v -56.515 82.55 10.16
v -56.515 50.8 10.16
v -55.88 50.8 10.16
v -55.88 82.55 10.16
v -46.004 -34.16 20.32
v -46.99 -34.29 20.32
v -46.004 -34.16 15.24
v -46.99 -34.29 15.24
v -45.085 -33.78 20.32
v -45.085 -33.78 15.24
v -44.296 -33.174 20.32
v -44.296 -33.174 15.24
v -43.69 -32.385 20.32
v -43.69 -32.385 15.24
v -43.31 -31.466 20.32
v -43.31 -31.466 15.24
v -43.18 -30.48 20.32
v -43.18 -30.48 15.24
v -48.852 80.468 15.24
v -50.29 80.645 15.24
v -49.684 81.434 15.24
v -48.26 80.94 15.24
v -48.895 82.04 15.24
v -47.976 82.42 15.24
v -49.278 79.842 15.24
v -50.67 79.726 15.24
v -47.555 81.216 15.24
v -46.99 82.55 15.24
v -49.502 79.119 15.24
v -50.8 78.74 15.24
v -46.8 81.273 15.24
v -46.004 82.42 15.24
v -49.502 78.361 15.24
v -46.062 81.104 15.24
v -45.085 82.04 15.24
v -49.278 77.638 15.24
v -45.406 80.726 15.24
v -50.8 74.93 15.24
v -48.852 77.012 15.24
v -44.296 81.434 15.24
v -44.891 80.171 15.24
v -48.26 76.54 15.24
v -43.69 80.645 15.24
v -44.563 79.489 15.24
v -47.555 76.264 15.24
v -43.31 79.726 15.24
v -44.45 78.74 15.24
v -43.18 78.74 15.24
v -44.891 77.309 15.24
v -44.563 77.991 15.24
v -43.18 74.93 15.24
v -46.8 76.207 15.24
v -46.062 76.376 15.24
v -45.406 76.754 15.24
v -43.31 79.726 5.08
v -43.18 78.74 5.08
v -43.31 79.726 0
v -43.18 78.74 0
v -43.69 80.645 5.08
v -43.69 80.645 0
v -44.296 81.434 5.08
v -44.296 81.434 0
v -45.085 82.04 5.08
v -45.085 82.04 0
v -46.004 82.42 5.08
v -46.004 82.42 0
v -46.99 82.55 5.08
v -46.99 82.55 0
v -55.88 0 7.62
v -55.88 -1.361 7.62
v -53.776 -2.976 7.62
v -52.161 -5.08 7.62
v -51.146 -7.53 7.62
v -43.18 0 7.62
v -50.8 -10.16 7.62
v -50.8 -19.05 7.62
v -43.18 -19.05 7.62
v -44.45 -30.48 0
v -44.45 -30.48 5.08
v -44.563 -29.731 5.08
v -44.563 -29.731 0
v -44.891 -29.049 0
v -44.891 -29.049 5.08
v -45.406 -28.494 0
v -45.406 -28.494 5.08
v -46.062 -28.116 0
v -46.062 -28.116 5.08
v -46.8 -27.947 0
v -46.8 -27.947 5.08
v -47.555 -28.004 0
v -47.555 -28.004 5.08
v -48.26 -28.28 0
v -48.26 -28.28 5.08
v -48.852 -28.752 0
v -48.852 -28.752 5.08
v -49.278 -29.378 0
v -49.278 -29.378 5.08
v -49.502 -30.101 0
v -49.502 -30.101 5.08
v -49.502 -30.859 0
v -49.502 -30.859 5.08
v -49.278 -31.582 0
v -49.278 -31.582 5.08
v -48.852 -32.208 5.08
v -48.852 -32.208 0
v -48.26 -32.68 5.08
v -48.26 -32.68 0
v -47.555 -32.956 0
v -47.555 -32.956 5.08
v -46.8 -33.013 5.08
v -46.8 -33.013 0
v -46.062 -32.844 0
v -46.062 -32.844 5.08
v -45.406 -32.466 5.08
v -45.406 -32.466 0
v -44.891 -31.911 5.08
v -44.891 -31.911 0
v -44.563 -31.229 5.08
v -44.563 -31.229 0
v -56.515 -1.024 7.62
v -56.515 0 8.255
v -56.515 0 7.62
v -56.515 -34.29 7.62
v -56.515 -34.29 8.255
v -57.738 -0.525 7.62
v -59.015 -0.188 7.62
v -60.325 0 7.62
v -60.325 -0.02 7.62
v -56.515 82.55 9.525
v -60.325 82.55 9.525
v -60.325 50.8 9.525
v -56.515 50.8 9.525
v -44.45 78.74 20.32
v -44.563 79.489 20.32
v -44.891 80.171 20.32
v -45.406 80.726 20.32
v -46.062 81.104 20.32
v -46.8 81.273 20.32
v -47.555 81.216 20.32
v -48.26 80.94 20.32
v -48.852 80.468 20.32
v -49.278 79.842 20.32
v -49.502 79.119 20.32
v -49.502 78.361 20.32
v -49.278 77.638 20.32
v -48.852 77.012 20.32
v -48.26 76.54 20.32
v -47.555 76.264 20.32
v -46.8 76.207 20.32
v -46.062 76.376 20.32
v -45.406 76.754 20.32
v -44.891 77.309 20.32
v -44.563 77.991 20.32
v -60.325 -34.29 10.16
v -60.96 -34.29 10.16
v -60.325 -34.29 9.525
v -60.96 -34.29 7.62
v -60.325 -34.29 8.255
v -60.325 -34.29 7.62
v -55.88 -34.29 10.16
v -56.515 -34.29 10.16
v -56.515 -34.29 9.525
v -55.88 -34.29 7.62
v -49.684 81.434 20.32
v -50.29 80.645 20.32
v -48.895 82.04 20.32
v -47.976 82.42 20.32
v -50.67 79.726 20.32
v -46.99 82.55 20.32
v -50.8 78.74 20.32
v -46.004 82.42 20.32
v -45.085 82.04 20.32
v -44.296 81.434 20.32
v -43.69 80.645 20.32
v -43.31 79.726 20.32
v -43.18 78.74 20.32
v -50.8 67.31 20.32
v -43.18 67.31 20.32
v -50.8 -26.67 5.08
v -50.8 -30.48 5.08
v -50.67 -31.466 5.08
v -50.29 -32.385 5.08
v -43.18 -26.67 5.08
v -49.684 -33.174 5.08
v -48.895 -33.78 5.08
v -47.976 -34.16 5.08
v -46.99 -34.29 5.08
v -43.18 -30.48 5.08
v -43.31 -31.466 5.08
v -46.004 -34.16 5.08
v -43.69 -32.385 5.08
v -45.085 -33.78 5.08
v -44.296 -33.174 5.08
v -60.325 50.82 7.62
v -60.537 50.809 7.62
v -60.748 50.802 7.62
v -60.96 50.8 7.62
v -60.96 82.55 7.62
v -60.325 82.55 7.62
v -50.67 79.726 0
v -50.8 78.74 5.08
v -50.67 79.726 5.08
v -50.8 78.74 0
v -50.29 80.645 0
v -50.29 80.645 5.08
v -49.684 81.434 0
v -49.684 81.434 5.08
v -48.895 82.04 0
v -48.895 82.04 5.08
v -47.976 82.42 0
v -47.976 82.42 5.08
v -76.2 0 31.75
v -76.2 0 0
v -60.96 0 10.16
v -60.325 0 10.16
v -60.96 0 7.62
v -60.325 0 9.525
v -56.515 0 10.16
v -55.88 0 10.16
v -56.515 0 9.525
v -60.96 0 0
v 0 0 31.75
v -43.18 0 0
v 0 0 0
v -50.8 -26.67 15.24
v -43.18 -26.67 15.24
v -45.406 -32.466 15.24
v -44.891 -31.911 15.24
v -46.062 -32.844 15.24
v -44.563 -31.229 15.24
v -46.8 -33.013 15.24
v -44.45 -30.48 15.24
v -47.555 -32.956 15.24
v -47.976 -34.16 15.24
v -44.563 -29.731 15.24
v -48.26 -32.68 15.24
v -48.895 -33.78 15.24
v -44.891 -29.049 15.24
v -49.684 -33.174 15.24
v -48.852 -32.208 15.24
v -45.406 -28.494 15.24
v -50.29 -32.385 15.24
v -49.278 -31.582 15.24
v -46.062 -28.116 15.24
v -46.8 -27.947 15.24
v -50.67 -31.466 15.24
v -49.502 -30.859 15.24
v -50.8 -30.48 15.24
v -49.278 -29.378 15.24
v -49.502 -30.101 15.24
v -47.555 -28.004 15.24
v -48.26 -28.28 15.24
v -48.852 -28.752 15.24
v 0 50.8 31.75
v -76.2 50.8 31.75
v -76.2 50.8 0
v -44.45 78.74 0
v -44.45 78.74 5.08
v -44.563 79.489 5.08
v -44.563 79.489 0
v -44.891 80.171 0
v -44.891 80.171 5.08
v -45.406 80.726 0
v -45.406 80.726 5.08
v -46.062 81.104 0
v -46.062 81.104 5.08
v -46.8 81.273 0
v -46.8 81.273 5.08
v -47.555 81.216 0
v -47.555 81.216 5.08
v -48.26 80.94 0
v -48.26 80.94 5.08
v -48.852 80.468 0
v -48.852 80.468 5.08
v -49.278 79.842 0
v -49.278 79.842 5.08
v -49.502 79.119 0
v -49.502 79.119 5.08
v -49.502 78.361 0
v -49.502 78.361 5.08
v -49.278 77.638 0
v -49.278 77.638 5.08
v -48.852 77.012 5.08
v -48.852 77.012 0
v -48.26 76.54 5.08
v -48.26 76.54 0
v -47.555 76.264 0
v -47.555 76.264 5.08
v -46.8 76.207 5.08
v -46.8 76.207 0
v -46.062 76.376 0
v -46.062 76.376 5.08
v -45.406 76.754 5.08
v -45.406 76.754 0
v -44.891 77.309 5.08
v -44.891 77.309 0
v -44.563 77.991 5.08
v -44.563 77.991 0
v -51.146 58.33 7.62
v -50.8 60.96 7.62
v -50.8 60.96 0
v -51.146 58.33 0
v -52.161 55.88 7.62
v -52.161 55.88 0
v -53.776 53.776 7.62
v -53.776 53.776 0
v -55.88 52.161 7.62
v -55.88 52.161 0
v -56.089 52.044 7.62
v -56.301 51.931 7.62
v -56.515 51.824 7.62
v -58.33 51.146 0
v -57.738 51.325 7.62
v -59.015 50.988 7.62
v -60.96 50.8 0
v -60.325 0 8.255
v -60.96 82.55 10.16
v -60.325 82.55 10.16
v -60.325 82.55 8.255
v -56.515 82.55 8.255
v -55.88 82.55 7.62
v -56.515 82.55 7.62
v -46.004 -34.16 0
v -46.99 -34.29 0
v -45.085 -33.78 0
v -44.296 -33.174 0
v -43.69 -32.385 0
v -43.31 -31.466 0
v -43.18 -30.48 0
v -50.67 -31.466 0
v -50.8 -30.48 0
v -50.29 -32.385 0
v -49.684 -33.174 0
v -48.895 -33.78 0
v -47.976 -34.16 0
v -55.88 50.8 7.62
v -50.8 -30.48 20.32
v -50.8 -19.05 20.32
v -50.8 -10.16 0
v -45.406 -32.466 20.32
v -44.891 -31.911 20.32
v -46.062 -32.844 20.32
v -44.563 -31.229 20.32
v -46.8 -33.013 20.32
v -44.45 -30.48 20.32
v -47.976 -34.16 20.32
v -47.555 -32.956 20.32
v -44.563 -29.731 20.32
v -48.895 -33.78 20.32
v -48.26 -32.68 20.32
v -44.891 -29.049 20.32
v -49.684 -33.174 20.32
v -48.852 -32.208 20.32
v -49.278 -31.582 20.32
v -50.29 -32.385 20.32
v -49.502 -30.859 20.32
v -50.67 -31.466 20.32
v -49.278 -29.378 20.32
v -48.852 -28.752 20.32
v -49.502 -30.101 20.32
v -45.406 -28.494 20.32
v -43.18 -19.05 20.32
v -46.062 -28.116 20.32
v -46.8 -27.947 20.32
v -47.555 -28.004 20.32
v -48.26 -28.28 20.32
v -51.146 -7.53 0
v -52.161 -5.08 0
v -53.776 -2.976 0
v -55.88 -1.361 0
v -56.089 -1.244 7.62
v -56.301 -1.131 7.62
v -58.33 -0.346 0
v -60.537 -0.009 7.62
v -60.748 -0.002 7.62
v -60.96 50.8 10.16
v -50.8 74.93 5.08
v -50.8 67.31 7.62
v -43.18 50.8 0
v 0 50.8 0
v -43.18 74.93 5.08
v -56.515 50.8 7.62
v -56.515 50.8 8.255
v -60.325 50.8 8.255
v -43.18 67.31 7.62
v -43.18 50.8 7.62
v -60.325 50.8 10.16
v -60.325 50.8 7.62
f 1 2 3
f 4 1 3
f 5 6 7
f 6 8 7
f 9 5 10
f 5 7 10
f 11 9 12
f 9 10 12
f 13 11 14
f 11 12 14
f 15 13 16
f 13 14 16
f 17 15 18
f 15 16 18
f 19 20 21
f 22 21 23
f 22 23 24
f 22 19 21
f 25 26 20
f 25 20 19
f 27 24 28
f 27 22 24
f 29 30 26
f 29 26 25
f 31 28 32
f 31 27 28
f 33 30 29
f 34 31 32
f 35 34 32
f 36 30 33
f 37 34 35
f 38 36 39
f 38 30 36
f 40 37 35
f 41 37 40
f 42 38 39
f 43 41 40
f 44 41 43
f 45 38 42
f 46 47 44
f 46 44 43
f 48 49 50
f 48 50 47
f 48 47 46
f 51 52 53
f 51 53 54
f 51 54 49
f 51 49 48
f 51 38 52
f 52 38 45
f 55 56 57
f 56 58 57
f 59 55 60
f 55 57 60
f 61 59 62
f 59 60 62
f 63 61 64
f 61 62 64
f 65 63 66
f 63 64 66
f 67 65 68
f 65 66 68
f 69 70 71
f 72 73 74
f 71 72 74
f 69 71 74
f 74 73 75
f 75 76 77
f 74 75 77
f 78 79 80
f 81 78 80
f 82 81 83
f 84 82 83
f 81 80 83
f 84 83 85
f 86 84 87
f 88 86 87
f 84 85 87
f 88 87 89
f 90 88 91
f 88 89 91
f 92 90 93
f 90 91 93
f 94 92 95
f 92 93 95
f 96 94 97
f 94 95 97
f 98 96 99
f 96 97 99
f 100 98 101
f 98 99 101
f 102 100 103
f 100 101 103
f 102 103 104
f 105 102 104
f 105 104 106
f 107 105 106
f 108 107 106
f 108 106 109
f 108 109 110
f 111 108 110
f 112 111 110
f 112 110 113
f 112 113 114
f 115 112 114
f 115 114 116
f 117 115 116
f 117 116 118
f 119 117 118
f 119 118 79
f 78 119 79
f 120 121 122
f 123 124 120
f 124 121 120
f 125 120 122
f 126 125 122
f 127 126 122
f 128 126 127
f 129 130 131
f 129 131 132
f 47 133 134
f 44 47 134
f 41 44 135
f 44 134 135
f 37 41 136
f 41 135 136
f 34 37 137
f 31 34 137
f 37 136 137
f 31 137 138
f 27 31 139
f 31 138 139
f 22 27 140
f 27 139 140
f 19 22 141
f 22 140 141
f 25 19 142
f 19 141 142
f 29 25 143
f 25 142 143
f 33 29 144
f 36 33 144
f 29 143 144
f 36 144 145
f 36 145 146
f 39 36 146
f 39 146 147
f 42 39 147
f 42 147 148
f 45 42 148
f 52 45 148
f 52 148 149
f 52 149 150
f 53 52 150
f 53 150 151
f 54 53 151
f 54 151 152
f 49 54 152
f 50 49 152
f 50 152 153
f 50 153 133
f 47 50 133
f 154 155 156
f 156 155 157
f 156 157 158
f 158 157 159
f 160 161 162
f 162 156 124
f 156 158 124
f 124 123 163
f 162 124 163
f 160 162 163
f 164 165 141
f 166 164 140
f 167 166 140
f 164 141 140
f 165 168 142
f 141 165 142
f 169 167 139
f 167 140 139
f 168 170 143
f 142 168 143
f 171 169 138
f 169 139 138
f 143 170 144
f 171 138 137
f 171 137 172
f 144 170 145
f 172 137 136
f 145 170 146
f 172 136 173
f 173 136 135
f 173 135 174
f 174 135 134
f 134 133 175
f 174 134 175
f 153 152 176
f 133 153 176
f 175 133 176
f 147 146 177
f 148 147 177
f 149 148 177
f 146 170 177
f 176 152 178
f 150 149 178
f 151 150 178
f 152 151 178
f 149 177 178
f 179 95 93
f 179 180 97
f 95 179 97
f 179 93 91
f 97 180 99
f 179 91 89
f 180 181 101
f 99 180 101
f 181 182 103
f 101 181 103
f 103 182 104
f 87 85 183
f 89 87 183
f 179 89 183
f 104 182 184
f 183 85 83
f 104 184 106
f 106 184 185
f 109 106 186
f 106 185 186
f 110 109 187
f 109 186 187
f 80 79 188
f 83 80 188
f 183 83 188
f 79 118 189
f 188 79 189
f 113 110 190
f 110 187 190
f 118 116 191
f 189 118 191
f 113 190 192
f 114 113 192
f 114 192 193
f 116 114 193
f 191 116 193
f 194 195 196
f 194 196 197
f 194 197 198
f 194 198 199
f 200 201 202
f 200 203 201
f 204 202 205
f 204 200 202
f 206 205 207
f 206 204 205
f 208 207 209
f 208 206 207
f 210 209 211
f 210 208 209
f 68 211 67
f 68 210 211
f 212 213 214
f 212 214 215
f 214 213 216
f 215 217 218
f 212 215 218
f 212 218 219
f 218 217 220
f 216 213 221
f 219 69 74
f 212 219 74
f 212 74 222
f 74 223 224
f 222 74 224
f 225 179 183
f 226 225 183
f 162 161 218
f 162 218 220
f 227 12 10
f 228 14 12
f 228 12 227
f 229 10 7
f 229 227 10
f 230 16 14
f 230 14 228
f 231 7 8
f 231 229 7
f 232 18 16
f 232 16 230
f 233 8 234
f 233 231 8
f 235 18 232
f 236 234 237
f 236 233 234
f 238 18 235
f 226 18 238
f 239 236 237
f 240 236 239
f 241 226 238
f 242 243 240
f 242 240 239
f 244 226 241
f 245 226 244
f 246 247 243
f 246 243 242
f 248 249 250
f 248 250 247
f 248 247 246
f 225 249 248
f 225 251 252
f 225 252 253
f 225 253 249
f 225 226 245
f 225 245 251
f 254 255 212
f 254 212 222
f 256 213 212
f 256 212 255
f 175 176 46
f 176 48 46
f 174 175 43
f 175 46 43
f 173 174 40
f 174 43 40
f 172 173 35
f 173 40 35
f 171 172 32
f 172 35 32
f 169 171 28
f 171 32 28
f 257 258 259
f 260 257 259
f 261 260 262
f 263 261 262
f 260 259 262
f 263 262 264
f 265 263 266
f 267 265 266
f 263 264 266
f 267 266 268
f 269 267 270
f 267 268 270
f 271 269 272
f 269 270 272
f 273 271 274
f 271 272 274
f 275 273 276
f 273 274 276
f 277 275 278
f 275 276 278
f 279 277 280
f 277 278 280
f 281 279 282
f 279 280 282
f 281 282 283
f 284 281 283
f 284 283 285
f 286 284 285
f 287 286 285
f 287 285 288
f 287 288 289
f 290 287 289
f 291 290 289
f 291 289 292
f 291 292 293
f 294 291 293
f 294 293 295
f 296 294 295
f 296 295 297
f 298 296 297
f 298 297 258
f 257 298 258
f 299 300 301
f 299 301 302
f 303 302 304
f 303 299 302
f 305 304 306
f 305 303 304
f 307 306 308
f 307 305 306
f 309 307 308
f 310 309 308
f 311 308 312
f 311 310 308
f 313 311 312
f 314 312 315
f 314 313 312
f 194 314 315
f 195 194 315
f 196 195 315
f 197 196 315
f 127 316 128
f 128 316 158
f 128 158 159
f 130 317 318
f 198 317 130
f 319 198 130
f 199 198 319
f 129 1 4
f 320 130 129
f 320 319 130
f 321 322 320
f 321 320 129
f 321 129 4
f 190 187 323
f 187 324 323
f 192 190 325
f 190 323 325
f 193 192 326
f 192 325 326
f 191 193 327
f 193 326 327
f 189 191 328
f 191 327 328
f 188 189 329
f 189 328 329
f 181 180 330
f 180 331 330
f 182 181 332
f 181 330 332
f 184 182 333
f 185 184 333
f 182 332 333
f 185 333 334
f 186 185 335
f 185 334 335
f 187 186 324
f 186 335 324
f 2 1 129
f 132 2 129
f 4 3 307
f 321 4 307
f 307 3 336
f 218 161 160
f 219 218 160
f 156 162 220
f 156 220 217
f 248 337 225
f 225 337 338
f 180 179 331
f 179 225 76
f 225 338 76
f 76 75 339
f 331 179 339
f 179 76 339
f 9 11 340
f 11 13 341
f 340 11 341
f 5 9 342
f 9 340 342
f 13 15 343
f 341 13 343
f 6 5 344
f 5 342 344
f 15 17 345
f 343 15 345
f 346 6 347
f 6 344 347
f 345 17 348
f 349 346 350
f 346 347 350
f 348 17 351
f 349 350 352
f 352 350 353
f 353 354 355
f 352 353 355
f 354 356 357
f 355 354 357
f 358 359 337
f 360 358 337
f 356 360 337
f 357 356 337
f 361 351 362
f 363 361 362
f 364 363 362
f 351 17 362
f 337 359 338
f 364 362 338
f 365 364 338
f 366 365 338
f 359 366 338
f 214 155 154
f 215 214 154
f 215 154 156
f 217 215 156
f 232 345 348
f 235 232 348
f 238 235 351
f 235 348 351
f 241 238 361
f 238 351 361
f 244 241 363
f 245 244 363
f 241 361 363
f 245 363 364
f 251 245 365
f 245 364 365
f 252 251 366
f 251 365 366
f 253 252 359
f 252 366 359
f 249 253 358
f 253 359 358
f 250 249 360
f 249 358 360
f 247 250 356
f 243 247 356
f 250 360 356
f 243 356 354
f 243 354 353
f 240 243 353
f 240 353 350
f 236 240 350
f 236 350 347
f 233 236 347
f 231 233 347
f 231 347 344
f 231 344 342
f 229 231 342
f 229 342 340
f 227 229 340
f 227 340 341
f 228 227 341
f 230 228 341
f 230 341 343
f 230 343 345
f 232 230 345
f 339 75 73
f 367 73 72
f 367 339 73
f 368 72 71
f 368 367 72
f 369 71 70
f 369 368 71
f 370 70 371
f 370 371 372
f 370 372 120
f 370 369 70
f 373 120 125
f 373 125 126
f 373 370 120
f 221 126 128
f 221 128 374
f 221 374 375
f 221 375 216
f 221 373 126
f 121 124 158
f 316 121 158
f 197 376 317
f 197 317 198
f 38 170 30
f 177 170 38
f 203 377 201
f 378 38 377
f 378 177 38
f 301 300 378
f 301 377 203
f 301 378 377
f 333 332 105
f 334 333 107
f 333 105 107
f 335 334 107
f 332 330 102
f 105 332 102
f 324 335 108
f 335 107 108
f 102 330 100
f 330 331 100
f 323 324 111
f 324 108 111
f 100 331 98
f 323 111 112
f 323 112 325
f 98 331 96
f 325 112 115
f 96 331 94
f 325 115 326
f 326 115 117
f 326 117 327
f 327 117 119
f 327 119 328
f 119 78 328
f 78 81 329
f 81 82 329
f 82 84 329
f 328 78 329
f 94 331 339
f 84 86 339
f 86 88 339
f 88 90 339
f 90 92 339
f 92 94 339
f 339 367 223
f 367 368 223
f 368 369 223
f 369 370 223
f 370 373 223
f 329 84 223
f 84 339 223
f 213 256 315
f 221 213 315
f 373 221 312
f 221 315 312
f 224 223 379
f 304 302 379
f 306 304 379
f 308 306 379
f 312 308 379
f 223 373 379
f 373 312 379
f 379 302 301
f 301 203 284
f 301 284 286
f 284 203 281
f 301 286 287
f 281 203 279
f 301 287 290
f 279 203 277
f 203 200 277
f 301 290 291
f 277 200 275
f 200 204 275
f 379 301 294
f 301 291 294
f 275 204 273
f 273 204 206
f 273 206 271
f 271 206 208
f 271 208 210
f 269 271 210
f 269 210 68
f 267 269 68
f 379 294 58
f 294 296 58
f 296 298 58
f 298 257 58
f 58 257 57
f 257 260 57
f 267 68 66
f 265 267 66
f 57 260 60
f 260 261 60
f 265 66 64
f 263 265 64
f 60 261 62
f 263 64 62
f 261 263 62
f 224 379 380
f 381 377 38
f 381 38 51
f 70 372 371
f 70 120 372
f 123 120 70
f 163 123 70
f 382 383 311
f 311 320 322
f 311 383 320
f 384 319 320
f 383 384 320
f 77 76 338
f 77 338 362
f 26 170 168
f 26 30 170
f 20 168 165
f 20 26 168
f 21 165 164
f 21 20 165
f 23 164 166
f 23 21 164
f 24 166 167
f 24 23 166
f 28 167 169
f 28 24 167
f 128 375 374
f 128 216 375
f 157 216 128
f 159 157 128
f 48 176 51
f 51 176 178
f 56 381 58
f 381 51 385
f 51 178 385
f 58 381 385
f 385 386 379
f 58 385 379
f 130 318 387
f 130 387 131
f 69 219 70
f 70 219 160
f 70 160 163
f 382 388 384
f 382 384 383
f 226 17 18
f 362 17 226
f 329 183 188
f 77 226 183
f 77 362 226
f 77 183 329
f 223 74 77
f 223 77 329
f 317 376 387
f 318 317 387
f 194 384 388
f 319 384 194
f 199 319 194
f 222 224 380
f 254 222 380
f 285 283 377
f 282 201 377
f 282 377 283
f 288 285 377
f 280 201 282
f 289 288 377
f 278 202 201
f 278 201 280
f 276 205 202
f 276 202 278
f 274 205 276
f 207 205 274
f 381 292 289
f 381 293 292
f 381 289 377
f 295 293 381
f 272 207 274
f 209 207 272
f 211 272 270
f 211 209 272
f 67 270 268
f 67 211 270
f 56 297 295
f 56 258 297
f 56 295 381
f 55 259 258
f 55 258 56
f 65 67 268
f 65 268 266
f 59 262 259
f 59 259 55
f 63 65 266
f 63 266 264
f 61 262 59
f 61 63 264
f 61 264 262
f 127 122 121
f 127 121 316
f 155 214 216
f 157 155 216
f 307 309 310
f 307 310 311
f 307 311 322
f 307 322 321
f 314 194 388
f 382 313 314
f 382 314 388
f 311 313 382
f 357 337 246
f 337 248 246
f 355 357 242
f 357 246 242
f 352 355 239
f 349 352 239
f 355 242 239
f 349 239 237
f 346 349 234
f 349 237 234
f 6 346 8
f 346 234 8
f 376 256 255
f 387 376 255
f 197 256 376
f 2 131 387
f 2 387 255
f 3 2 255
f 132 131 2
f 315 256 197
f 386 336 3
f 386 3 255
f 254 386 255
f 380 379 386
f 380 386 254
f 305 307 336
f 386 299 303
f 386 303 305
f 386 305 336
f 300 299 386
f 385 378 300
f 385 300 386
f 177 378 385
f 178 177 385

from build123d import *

# Parameters (mm, degrees)
SKETCH1_W                = 76.2
SKETCH1_H                = 50.8
BOSS_EXTRUDE1_DEPTH      = 31.75
BOSS_EXTRUDE2_DEPTH      = 31.75
BOSS_EXTRUDE2_DEPTH_BACK = 85.09
SKETCH4_W                = 5.08
SKETCH4_H                = 2.54
SKETCH4_W_2              = 7.62
SKETCH4_H_2              = 7.62
FILLET1_R                = 10.16
SKETCH5_W                = 7.62
SKETCH5_H                = 7.62
BOSS_EXTRUDE3_DEPTH      = 12.7
SKETCH6_W                = 7.62
SKETCH6_H                = 2.54
CUT_EXTRUDE1_DEPTH       = 7.62
SKETCH7_W                = 7.62
SKETCH7_H                = 2.54
CUT_EXTRUDE2_DEPTH       = 7.62
SKETCH9_W                = 7.62
SKETCH9_H                = 5.08
BOSS_EXTRUDE4_DEPTH      = 7.62
SKETCH10_W               = 7.62
SKETCH10_H               = 5.08
BOSS_EXTRUDE5_DEPTH      = 7.62
FILLET2_R                = 3.81
CUT_EXTRUDE3_REACH       = 116.166
SKETCH11_R               = 2.54
CUT_EXTRUDE4_REACH       = 116.166
SKETCH12_R               = 2.54
CUT_EXTRUDE5_REACH       = 145.06
SKETCH13_W               = 3.81
SKETCH13_H               = 0.635
SKETCH14_W               = 3.81
SKETCH14_H               = 0.635
CUT_EXTRUDE6_DEPTH       = 34.29


# Some blends are built 0.0001 mm under size
with BuildPart() as part:
    # Sketch1 → Boss-Extrude1 (new body)
    with BuildSketch(Plane.XY):
        with Locations((-38.1, 25.4)):
            Rectangle(SKETCH1_W, SKETCH1_H)
    extrude(amount=BOSS_EXTRUDE1_DEPTH)

    # Sketch4 → Boss-Extrude2 (add, two sides: drawn at the far end of the back side and taken through both)
    with BuildSketch(Plane(origin=(0, 50.8, 0), x_dir=(1, 0, 0), z_dir=(0, 1, 0)).offset(-BOSS_EXTRUDE2_DEPTH_BACK)):
        with Locations((-58.42, -8.89)):
            Rectangle(SKETCH4_W, SKETCH4_H)
        with Locations((-46.99, -3.81)):
            Rectangle(SKETCH4_W_2, SKETCH4_H_2)
    extrude(amount=BOSS_EXTRUDE2_DEPTH + BOSS_EXTRUDE2_DEPTH_BACK)

    # Fillet1
    # the kernel refuses this fillet: 10.16 mm, written as the material it adds along each edge
    with BuildSketch(Plane(origin=(-50.8, 50.8, 7.62), x_dir=(-1, 0, 0), z_dir=(0, 0, -1)), Plane(origin=(-50.8, 0, 0), x_dir=(-1, 0, 0), z_dir=(0, 0, 1))) as fillet1_piece_1:
        with BuildLine():
            CenterArc((FILLET1_R, FILLET1_R), FILLET1_R, 180, 90)
            Line((0, FILLET1_R), (0, 0))
            Line((0, 0), (FILLET1_R, 0))
        make_face()
    extrude(amount=7.62)

    # Sketch5 → Boss-Extrude3 (add)
    with BuildSketch(Plane.XY.offset(7.62)):
        with Locations((-46.99, 71.12)):
            Rectangle(SKETCH5_W, SKETCH5_H)
        with Locations((-46.99, -22.86)):
            Rectangle(SKETCH5_W, SKETCH5_H)
    extrude(amount=BOSS_EXTRUDE3_DEPTH)

    # Sketch6 → Cut-Extrude1 (cut)
    with BuildSketch(Plane.XZ.offset(34.29)):
        with Locations((-46.99, 6.35)):
            Rectangle(SKETCH6_W, SKETCH6_H)
    extrude(amount=-CUT_EXTRUDE1_DEPTH, mode=Mode.SUBTRACT)

    # Sketch7 → Cut-Extrude2 (cut)
    with BuildSketch(Plane(origin=(0, 82.55, 0), x_dir=(1, 0, 0), z_dir=(0, 1, 0))):
        with Locations((-46.99, -6.35)):
            Rectangle(SKETCH7_W, SKETCH7_H)
    extrude(amount=-CUT_EXTRUDE2_DEPTH, mode=Mode.SUBTRACT)

    # Sketch9 → Boss-Extrude4 (add)
    with BuildSketch(Plane(origin=(0, -26.67, 0), x_dir=(-1, 0, 0), z_dir=(0, -1, 0))):
        with Locations((46.99, -17.78)):
            Rectangle(SKETCH9_W, SKETCH9_H)
    extrude(amount=BOSS_EXTRUDE4_DEPTH)

    # Sketch10 → Boss-Extrude5 (add)
    with BuildSketch(Plane(origin=(0, 74.93, 0), x_dir=(1, 0, 0), z_dir=(0, 1, 0))):
        with Locations((-46.99, -17.78)):
            Rectangle(SKETCH10_W, SKETCH10_H)
    extrude(amount=BOSS_EXTRUDE5_DEPTH)

    # Fillet2
    fillet2_edges = [part.edges().sort_by_distance(p)[0] for p in [
        (-43.18, 82.55, 2.54),
        (-50.8, 82.55, 2.54),
        (-43.18, 82.55, 17.78),
        (-50.8, 82.55, 17.78),
        (-50.8, -34.29, 2.54),
        (-43.18, -34.29, 2.54),
        (-50.8, -34.29, 17.78),
        (-43.18, -34.29, 17.78),
    ]]
    fillet(fillet2_edges, radius=FILLET2_R - 0.0001)  # a hair under: the kernel refuses the full size

    # Cut-Extrude3: up to this face of the body (flat: up to its plane)
    cut_extrude3_end = Plane(part.part.faces().sort_by_distance((-39.240735796, 25.146964219, 0))[0])
    # Sketch11 → Cut-Extrude3 (cut, up to the picked face)
    with BuildSketch(Plane.XY.offset(20.32), mode=Mode.PRIVATE) as cut_extrude3_sk1:
        with Locations((-46.99, 78.74)):
            Circle(SKETCH11_R)
    cut_extrude3_tool1 = split(extrude(cut_extrude3_sk1.sketch, amount=-CUT_EXTRUDE3_REACH, mode=Mode.PRIVATE), bisect_by=cut_extrude3_end, keep=Keep.BOTH, mode=Mode.PRIVATE)
    add(cut_extrude3_tool1.solids().sort_by(Axis((-46.99, 78.74, 20.32), (0, 0, -1)))[0], mode=Mode.SUBTRACT)

    # Cut-Extrude4: up to this face of the body (flat: up to its plane)
    cut_extrude4_end = Plane(part.part.faces().sort_by_distance((-39.204923448, 24.89929007, 0))[0])
    # Sketch12 → Cut-Extrude4 (cut, up to the picked face)
    with BuildSketch(Plane.XY.offset(20.32), mode=Mode.PRIVATE) as cut_extrude4_sk1:
        with Locations((-46.99, -30.48)):
            Circle(SKETCH12_R)
    cut_extrude4_tool1 = split(extrude(cut_extrude4_sk1.sketch, amount=-CUT_EXTRUDE4_REACH, mode=Mode.PRIVATE), bisect_by=cut_extrude4_end, keep=Keep.BOTH, mode=Mode.PRIVATE)
    add(cut_extrude4_tool1.solids().sort_by(Axis((-46.99, -30.48, 20.32), (0, 0, -1)))[0], mode=Mode.SUBTRACT)

    # Cut-Extrude5: up to this face of the body (flat: up to its plane)
    cut_extrude5_end = Plane(part.part.faces().sort_by_distance((-37.151107955, 50.8, 16.634474432))[0])
    # Sketch13 → Cut-Extrude5 (cut, up to the picked face)
    with BuildSketch(Plane(origin=(0, 82.55, 0), x_dir=(1, 0, 0), z_dir=(0, 1, 0)), mode=Mode.PRIVATE) as cut_extrude5_sk1:
        with Locations((-58.42, -9.8425)):
            Rectangle(SKETCH13_W, SKETCH13_H)
    cut_extrude5_tool1 = split(extrude(cut_extrude5_sk1.sketch, amount=-CUT_EXTRUDE5_REACH, mode=Mode.PRIVATE), bisect_by=cut_extrude5_end, keep=Keep.BOTH, mode=Mode.PRIVATE)
    # Sketch13 → Cut-Extrude5 (cut, up to the picked face)
    with BuildSketch(Plane(origin=(0, 82.55, 0), x_dir=(1, 0, 0), z_dir=(0, 1, 0)), mode=Mode.PRIVATE) as cut_extrude5_sk2:
        with Locations((-58.42, -7.9375)):
            Rectangle(SKETCH13_W, SKETCH13_H)
    cut_extrude5_tool2 = split(extrude(cut_extrude5_sk2.sketch, amount=-CUT_EXTRUDE5_REACH, mode=Mode.PRIVATE), bisect_by=cut_extrude5_end, keep=Keep.BOTH, mode=Mode.PRIVATE)
    add(cut_extrude5_tool1.solids().sort_by(Axis((-58.42, 82.55, 9.8425), (0, -1, 0)))[0], mode=Mode.SUBTRACT)
    add(cut_extrude5_tool2.solids().sort_by(Axis((-58.42, 82.55, 7.9375), (0, -1, 0)))[0], mode=Mode.SUBTRACT)

    # Sketch14 → Cut-Extrude6 (cut)
    with BuildSketch(Plane(origin=(0, -34.29, 0), x_dir=(-1, 0, 0), z_dir=(0, -1, 0))):
        with Locations((58.42, -9.8425)):
            Rectangle(SKETCH14_W, SKETCH14_H)
        with Locations((58.42, -7.9375)):
            Rectangle(SKETCH14_W, SKETCH14_H)
    extrude(amount=-CUT_EXTRUDE6_DEPTH, mode=Mode.SUBTRACT)


solid = part.part
